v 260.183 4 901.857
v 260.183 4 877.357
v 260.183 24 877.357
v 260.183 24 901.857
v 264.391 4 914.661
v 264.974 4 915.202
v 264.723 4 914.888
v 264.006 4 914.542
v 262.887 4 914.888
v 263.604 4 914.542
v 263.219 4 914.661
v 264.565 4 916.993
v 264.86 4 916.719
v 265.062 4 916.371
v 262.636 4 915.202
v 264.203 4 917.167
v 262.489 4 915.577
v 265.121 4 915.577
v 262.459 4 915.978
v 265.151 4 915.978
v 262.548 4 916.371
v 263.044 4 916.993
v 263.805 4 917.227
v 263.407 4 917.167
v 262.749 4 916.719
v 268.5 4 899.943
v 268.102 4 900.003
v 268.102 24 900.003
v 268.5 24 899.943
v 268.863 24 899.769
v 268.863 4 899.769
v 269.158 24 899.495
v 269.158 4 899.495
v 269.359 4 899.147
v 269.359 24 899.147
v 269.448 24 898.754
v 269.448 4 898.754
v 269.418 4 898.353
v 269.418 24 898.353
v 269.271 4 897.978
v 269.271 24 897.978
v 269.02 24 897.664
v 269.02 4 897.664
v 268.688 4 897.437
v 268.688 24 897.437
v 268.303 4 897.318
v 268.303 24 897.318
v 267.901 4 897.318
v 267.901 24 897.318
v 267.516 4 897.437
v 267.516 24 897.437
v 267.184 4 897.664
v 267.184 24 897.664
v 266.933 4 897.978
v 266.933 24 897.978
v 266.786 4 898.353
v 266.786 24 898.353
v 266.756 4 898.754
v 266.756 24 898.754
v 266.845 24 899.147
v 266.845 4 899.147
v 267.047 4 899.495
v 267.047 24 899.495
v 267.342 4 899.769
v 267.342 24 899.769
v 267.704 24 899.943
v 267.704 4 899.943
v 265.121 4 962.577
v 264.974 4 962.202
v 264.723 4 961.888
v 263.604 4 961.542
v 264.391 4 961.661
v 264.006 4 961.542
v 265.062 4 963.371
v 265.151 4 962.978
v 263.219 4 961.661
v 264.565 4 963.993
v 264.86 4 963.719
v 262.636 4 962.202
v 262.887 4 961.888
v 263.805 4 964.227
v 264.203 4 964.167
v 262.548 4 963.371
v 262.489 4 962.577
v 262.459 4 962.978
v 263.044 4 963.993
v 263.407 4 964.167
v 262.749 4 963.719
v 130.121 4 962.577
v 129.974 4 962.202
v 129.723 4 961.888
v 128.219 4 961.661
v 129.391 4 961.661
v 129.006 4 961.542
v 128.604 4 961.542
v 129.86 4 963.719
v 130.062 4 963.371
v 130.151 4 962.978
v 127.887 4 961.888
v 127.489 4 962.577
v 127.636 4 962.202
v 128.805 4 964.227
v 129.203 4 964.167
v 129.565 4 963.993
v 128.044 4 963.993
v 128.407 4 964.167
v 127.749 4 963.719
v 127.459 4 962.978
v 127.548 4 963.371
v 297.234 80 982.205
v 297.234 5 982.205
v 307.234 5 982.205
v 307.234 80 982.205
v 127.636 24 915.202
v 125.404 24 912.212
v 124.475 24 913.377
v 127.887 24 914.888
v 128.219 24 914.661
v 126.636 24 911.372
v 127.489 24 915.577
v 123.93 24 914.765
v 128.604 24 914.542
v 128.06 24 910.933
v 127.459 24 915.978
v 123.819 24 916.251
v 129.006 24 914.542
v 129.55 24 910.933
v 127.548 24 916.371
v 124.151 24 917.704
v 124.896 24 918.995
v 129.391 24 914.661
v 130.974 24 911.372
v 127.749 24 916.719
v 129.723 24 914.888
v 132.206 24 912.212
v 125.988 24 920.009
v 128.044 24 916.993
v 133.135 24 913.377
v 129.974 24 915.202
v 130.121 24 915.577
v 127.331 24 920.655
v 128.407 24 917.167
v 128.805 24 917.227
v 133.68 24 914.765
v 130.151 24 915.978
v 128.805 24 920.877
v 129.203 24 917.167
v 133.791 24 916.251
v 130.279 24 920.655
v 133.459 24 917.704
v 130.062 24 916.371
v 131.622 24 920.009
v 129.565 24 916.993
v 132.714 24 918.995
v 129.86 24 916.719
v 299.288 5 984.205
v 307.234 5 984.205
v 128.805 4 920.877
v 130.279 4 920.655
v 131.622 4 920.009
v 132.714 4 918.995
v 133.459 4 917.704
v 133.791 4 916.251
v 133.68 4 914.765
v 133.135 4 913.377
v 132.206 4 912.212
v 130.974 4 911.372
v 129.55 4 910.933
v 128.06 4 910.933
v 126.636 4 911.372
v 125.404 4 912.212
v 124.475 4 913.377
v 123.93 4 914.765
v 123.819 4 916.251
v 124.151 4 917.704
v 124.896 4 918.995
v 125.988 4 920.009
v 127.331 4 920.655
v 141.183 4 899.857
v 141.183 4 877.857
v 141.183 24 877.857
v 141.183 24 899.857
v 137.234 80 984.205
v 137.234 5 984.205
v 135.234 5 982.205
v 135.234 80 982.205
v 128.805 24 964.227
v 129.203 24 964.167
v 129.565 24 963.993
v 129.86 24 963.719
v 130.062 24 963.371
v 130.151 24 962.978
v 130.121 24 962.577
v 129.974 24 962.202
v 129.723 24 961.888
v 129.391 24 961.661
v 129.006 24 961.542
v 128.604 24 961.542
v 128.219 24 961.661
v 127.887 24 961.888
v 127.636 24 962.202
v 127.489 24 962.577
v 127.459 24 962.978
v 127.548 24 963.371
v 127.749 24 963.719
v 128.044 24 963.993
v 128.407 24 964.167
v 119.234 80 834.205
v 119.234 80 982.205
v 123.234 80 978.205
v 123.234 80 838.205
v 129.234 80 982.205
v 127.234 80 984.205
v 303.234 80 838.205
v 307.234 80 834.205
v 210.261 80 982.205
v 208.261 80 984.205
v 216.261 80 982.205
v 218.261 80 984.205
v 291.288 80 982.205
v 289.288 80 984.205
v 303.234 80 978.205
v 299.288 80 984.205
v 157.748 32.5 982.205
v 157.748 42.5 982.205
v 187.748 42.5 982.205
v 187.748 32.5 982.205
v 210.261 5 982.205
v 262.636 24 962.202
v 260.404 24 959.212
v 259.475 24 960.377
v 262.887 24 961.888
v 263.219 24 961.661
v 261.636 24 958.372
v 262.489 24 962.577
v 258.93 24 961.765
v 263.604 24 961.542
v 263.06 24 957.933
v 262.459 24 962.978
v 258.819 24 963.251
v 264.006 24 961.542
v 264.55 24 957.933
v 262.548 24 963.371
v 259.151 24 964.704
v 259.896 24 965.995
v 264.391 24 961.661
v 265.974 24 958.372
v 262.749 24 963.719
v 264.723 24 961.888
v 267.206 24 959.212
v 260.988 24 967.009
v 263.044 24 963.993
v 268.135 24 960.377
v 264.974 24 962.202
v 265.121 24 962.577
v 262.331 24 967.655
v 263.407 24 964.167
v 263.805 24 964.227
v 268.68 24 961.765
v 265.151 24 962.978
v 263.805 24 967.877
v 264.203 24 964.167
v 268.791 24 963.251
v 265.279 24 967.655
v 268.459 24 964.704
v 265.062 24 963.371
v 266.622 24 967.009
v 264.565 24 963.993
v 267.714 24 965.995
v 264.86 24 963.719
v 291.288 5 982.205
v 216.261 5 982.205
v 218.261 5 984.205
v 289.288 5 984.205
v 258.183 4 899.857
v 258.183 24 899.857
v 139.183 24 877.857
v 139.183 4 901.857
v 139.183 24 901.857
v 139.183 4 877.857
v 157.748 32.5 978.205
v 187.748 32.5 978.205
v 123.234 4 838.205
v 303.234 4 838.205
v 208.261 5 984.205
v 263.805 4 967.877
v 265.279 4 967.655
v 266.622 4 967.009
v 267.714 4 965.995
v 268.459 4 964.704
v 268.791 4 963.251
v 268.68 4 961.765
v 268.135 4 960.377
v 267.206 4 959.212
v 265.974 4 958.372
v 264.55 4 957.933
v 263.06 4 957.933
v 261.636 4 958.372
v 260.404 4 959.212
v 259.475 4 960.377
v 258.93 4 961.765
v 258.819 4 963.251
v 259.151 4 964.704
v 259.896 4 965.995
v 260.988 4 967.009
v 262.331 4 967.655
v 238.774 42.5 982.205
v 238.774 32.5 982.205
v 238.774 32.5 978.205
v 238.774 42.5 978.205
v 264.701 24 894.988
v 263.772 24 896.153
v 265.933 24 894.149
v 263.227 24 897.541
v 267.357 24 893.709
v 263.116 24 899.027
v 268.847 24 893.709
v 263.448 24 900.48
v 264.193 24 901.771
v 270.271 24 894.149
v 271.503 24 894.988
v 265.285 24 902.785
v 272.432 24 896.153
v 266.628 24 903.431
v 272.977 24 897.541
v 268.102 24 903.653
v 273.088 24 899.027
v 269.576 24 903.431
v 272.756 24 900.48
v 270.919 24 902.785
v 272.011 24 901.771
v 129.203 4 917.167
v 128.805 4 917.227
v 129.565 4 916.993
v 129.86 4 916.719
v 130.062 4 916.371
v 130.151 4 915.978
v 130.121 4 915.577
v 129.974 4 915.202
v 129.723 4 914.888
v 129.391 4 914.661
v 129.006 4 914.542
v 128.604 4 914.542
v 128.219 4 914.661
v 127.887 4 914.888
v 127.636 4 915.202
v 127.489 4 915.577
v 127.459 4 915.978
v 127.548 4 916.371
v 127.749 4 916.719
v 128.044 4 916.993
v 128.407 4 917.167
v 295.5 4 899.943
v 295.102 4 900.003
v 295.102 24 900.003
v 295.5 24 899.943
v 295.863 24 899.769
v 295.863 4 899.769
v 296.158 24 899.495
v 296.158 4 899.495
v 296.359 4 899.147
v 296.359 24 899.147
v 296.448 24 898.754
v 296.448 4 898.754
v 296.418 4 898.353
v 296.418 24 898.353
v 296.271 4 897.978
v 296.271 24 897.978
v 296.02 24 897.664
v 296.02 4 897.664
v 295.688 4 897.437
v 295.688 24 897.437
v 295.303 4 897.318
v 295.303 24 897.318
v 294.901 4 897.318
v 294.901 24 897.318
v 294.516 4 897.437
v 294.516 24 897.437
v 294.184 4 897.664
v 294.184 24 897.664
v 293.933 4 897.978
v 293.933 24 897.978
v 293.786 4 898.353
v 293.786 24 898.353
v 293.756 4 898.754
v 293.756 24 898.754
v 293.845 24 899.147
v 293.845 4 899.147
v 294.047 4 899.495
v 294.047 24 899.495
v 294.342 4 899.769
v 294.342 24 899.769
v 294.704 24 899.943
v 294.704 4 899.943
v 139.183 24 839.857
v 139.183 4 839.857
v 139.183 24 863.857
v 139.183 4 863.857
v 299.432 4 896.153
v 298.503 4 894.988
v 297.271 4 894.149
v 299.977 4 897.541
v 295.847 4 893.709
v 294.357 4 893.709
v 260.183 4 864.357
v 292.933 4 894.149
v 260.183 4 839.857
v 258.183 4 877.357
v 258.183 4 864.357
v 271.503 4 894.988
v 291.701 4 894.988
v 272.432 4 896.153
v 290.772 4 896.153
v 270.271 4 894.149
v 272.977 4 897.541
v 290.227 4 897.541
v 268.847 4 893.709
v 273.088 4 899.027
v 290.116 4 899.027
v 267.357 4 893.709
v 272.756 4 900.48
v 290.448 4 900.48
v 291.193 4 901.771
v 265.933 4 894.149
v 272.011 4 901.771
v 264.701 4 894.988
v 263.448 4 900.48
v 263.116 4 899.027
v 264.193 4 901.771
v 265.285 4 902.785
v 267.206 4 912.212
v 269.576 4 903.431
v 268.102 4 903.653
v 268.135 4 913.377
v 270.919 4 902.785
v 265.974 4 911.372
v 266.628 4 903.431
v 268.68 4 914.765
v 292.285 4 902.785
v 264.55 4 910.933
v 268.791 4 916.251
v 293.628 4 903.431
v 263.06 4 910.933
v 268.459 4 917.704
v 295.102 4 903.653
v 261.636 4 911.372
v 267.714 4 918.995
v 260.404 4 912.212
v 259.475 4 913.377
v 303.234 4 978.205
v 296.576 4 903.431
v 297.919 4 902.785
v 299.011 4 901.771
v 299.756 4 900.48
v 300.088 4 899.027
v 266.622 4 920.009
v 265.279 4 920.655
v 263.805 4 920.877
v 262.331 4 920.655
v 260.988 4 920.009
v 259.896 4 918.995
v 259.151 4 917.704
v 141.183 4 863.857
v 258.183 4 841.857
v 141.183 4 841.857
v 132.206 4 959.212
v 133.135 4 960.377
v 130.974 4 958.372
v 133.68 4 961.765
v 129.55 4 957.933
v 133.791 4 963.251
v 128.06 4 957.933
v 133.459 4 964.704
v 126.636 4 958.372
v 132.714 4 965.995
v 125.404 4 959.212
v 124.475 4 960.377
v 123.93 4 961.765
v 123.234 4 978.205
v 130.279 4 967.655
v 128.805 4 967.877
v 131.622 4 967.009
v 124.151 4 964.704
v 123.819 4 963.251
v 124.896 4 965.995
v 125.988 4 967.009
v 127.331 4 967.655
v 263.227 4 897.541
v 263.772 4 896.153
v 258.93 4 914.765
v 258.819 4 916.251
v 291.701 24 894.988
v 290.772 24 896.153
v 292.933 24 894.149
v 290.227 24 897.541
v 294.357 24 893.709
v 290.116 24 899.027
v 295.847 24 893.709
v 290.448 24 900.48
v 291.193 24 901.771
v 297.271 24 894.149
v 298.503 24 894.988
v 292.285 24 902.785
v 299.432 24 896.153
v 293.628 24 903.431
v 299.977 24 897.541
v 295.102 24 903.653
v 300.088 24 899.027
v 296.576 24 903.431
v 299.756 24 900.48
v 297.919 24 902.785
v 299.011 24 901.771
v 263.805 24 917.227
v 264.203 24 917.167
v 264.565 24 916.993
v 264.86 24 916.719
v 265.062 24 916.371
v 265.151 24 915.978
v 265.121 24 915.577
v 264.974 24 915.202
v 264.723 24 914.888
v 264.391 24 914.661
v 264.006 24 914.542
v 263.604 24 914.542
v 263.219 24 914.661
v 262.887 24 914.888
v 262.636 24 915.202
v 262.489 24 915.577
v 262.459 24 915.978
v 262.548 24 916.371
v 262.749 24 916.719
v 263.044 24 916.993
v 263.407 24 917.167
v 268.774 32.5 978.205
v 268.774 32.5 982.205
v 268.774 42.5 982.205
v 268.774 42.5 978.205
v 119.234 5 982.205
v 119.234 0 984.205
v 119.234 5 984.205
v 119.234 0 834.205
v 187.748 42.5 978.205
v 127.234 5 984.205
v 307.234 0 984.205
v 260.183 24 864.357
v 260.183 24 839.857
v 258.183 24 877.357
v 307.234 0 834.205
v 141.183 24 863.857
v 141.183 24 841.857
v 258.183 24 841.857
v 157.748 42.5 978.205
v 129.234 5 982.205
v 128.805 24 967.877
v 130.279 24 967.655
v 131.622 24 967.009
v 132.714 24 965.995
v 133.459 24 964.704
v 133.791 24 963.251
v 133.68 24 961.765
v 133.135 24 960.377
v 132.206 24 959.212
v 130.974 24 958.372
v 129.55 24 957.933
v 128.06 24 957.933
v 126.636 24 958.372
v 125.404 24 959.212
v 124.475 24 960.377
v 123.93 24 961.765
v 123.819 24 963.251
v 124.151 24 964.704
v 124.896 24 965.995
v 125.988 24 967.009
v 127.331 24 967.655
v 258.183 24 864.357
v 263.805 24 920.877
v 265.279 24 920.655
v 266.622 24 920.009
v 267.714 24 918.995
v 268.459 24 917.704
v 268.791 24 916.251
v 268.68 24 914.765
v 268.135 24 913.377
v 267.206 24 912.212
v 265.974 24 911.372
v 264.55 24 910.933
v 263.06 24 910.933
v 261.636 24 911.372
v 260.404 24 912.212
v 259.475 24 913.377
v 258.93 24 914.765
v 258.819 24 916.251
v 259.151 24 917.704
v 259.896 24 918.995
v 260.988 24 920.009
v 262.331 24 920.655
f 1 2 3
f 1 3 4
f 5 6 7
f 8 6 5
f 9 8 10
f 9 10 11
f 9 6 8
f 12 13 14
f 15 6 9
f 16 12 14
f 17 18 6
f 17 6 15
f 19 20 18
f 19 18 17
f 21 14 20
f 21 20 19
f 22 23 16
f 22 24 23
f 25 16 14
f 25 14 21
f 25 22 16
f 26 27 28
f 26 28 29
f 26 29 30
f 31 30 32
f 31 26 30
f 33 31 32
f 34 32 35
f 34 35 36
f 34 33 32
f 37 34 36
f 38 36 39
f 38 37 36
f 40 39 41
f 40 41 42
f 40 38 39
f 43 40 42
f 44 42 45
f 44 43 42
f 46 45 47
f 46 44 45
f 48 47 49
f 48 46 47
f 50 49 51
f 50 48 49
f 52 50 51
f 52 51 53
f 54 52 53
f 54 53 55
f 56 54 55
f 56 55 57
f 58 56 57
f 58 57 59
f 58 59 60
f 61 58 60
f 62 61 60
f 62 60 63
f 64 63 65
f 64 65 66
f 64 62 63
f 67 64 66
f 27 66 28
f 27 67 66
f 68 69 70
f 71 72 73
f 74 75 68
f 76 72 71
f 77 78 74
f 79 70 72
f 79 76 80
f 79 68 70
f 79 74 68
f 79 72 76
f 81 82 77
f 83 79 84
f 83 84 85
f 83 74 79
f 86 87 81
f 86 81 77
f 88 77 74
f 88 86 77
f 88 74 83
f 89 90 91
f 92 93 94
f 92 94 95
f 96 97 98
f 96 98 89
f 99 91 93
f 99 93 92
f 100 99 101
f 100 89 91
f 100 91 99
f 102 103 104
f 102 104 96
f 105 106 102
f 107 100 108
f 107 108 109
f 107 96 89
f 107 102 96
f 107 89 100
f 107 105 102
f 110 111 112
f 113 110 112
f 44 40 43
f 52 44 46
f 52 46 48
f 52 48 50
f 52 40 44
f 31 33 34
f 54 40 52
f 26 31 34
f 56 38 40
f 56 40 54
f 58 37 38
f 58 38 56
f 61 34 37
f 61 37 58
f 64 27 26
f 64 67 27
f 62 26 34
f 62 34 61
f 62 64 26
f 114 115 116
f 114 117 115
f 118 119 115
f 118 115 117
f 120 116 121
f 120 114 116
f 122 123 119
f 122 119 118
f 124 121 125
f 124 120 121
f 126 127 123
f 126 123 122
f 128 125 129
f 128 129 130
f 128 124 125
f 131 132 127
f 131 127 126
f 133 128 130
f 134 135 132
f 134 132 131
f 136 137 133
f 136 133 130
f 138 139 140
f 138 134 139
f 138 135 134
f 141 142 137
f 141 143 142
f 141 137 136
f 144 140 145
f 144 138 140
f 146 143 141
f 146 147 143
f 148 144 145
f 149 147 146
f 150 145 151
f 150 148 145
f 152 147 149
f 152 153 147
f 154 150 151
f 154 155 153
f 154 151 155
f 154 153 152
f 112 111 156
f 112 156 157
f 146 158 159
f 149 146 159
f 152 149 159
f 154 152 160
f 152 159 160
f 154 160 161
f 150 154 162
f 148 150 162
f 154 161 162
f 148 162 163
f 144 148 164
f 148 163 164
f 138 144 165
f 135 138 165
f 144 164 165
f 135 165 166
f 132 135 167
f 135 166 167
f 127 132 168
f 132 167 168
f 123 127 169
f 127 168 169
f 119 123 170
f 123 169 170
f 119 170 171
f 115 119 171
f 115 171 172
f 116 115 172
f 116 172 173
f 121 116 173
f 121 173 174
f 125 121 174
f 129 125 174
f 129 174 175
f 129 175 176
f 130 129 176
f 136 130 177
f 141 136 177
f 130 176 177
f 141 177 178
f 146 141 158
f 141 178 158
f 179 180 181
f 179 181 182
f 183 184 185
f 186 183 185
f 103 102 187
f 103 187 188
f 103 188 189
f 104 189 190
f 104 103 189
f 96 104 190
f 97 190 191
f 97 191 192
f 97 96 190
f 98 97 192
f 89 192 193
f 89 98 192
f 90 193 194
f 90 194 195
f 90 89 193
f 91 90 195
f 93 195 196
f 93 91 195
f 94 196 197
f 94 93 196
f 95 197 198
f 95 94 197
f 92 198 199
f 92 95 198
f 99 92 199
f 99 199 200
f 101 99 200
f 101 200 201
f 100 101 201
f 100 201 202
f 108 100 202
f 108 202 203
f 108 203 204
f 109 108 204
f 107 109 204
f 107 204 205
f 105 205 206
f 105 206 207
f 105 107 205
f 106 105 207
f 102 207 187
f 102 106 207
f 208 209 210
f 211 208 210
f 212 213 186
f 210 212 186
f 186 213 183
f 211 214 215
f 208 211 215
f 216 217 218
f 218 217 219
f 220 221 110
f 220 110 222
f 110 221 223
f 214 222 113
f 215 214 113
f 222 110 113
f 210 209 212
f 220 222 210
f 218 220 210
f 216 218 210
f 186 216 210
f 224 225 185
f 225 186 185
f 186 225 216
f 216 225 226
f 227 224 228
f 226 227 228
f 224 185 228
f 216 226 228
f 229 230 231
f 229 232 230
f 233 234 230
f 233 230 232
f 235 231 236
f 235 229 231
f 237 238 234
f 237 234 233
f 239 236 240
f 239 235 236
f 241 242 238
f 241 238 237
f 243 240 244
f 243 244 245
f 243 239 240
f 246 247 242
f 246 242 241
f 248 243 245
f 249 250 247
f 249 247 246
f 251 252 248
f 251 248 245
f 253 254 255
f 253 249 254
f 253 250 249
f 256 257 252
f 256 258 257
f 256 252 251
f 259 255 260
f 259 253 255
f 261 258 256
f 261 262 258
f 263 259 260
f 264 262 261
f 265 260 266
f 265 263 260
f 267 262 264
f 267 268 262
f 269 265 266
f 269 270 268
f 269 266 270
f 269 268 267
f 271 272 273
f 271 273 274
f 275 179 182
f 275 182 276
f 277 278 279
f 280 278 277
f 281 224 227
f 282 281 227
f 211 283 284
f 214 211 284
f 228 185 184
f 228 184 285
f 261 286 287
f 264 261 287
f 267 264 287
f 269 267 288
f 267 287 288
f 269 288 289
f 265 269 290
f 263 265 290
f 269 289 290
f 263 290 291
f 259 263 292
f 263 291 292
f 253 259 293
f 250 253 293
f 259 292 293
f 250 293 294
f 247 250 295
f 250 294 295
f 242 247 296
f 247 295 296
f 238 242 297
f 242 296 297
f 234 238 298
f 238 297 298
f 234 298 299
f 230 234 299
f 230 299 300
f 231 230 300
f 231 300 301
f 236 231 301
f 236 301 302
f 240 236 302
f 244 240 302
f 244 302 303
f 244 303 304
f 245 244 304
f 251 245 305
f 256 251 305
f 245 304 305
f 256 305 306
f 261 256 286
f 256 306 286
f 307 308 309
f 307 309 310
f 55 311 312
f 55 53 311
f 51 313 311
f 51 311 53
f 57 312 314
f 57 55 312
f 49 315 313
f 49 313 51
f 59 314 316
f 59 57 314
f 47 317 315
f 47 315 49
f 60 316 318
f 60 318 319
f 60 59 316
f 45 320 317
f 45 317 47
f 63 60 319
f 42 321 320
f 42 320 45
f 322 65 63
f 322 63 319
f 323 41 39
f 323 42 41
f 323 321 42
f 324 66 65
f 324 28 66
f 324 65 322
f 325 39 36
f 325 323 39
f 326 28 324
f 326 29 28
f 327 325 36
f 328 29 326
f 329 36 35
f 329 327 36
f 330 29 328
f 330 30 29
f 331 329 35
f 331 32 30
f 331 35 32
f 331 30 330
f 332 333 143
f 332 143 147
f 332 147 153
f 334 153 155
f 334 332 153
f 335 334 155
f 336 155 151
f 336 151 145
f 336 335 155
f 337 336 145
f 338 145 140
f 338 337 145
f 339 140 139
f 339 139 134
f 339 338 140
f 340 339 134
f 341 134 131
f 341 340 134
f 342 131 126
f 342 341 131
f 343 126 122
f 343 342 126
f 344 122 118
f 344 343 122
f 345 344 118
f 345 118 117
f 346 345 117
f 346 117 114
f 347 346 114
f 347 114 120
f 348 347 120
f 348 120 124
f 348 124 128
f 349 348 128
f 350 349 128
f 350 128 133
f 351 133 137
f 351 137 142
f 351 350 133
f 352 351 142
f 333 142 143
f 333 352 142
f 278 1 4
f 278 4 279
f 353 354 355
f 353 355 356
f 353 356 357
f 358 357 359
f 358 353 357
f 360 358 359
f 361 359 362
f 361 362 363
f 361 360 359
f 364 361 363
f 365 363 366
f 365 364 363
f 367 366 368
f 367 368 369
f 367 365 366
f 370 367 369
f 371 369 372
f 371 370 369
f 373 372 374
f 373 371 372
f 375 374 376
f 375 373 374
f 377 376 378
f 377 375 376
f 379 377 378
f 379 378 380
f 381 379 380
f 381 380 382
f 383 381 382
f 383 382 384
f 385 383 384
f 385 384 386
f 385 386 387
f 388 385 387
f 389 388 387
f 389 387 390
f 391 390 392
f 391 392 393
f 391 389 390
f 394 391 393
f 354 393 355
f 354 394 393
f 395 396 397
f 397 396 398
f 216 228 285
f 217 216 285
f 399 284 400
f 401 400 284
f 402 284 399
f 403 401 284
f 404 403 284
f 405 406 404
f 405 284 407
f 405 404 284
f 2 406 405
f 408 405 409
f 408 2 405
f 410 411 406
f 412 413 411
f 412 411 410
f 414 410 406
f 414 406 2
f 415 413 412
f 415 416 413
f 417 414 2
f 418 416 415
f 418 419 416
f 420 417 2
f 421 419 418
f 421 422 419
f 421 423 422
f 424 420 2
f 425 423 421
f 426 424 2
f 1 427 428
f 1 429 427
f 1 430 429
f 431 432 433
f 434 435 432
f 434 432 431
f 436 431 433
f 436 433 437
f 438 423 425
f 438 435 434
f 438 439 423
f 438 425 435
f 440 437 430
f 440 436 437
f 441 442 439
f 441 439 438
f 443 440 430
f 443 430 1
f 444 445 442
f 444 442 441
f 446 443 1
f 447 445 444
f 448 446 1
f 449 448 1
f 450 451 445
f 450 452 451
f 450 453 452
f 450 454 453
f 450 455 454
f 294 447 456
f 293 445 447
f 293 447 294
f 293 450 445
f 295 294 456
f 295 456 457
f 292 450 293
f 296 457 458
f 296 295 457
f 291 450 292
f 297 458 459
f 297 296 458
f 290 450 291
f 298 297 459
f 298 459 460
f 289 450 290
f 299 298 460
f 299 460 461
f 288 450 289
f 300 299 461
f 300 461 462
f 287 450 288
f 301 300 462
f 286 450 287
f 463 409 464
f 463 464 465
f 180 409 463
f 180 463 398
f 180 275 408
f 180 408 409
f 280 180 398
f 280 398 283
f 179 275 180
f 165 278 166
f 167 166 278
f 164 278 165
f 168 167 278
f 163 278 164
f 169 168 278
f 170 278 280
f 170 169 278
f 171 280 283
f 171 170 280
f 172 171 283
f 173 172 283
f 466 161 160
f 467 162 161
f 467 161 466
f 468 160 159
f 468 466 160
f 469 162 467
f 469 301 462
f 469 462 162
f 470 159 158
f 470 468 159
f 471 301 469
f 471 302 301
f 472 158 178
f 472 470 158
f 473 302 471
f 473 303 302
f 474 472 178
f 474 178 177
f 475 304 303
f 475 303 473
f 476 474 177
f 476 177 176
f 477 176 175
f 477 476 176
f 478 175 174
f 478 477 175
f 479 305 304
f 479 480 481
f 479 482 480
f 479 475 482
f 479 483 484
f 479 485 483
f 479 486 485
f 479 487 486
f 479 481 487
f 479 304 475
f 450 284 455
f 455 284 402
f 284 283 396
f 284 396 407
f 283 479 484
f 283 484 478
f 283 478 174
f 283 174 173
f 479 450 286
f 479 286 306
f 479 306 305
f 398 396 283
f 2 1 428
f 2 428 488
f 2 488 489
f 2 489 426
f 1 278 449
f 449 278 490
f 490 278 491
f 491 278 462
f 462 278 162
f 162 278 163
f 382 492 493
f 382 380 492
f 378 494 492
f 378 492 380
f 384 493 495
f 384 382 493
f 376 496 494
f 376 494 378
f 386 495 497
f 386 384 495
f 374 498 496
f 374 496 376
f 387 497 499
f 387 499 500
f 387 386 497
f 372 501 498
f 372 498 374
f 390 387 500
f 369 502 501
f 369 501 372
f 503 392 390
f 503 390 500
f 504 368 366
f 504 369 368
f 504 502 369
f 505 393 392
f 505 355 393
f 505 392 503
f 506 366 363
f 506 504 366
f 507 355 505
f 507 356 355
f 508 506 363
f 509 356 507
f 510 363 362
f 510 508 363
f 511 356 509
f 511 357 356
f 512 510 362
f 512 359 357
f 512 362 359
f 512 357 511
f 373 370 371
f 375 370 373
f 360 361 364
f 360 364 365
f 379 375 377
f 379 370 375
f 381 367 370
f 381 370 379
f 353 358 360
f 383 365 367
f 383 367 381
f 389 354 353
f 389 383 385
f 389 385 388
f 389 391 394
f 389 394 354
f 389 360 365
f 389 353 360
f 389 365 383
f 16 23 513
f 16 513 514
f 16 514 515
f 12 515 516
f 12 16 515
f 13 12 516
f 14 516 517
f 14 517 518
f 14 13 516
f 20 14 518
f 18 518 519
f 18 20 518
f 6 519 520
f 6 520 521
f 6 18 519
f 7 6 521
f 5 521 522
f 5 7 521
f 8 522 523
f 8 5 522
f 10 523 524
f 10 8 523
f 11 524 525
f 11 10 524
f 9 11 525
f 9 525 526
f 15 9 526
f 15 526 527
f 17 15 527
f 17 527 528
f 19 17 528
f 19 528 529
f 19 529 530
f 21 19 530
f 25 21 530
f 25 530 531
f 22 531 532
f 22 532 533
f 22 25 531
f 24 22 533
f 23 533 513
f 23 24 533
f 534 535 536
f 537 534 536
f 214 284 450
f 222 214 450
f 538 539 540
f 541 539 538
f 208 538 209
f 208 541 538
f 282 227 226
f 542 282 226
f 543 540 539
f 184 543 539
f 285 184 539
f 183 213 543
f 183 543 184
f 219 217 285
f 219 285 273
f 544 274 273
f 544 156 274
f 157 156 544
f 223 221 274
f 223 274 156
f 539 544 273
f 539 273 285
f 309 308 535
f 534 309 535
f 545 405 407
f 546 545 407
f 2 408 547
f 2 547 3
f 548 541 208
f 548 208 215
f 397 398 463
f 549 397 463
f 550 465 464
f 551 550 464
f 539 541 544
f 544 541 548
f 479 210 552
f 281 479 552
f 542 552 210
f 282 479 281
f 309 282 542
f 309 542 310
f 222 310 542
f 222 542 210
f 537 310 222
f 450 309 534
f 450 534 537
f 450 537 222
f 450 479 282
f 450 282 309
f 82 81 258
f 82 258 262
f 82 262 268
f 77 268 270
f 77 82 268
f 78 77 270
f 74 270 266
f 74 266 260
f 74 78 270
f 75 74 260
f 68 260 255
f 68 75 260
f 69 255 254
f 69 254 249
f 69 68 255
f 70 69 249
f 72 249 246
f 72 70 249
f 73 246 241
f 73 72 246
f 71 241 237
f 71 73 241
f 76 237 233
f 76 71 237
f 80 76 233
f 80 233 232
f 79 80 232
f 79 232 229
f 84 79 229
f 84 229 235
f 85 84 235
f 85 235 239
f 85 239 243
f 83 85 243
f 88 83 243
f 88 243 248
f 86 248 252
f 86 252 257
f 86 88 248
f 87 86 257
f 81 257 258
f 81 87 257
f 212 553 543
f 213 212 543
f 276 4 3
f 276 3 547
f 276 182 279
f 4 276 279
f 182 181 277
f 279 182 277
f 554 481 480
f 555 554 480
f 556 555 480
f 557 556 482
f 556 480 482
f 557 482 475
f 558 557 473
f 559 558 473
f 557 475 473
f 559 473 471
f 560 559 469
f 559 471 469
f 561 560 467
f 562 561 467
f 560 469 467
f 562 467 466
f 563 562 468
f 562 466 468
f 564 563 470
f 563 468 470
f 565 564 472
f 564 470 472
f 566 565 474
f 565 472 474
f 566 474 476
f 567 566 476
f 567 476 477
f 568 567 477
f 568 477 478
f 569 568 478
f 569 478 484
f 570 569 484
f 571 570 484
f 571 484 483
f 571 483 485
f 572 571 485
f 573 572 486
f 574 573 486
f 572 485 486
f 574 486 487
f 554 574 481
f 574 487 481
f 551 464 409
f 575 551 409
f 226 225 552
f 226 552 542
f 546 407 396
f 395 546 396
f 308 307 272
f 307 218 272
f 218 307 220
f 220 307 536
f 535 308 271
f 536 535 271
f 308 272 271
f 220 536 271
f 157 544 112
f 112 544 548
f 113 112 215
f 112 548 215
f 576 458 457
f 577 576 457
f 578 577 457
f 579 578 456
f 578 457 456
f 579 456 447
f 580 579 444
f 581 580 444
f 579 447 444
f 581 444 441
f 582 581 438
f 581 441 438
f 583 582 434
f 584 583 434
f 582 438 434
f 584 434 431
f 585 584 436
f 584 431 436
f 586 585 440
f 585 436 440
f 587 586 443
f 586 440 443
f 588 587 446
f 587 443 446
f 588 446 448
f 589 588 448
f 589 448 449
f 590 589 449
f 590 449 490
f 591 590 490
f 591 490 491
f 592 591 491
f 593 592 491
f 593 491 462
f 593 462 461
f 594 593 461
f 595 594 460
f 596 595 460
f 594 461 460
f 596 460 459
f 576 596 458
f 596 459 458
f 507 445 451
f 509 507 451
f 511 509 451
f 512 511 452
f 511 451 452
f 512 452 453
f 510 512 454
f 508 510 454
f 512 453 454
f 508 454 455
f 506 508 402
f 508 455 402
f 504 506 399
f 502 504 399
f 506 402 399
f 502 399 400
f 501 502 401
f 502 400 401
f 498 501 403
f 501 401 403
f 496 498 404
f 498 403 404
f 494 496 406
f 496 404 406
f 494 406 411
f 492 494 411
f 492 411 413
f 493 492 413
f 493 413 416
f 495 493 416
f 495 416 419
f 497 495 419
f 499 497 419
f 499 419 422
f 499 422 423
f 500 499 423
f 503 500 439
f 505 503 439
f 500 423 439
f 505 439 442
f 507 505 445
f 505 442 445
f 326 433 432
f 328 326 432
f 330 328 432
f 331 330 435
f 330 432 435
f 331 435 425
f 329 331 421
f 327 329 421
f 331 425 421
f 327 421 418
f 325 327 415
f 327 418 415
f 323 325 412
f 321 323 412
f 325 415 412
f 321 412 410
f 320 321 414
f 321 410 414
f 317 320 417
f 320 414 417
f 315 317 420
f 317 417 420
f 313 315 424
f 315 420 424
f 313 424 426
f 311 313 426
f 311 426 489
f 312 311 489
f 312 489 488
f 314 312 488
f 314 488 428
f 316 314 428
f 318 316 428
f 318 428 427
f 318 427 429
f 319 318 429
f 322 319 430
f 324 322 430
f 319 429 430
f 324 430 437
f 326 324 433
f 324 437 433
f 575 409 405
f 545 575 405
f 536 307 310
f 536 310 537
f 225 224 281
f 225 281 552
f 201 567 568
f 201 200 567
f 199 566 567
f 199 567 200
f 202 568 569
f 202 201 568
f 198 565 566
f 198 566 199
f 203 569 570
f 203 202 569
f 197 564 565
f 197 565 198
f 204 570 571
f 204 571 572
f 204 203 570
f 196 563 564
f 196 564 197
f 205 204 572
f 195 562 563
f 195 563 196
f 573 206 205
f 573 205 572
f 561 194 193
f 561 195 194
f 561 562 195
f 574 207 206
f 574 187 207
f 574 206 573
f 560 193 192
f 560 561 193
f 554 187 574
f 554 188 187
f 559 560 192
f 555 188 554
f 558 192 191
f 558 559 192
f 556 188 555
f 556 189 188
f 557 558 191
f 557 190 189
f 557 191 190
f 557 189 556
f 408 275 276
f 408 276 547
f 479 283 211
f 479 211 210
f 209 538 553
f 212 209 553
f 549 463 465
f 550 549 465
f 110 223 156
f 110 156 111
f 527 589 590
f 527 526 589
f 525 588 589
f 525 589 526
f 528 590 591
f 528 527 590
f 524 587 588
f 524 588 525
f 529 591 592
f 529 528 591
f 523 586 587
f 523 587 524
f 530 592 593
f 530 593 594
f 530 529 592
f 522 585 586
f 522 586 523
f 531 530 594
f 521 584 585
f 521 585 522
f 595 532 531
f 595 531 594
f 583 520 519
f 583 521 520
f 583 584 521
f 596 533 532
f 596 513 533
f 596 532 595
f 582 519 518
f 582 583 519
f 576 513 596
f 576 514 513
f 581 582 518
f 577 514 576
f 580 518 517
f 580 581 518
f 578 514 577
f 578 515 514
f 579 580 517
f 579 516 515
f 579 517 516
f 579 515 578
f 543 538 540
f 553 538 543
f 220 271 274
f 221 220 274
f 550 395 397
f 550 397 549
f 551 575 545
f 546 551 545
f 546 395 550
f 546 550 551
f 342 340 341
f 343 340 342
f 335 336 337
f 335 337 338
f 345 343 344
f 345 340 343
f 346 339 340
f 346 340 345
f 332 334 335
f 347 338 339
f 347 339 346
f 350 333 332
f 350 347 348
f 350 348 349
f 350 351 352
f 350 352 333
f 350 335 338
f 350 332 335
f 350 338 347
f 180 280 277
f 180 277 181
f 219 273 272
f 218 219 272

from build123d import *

# Parameters (mm, degrees)
SZKIC1_W                    = 180
SZKIC1_H                    = 140
DODANIE_WYCI_GNI_CIE1_DEPTH = 4
SZKIC6_R                    = 5
SZKIC6_R_2                  = 1.35
DODANIE_WYCI_GNI_CIE2_DEPTH = 20
SZKIC13_W                   = 188
SZKIC13_H                   = 148
SZKIC13_W_2                 = 180
SZKIC13_H_2                 = 140
DODANIE_WYCI_GNI_CIE3_DEPTH = 80
SZKIC14_W                   = 188
SZKIC14_H                   = 5
DODANIE_WYCI_GNI_CIE4_DEPTH = 2
DODANIE_WYCI_GNI_CIE5_DEPTH = 75
WYTNIJ_WYCI_GNI_CIE1_REACH  = 352.281
SZKIC17_W                   = 30
SZKIC17_H                   = 10


with BuildPart() as part:
    # Szkic1 → Dodanie-wyciągnięcie1 (new body)
    with BuildSketch(Plane(origin=(0, 0, 0), x_dir=(-1, 0, 0), z_dir=(0, 1, 0))):
        with Locations((-213.234437894, 908.204921089)):
            Rectangle(SZKIC1_W, SZKIC1_H)
    extrude(amount=DODANIE_WYCI_GNI_CIE1_DEPTH)

    # Szkic6 → Dodanie-wyciągnięcie2 (add)
    # profile 1 of 8: a face of its own
    with BuildSketch(Plane(origin=(0, 4, 0), x_dir=(1, 0, 0), z_dir=(0, 1, 0))):
        with Locations(Location((263.804943957, -915.877316695, 0), (0, 0, 270))):
            Circle(SZKIC6_R)
        with Locations(Location((263.804943957, -915.877316695, 0), (0, 0, 270))):
            Circle(SZKIC6_R_2, mode=Mode.SUBTRACT)
    # profile 2 of 8: a face of its own
    with BuildSketch(Plane(origin=(0, 4, 0), x_dir=(1, 0, 0), z_dir=(0, 1, 0))):
        with Locations(Location((263.804943957, -962.877316695, 0), (0, 0, 270))):
            Circle(SZKIC6_R)
        with Locations(Location((263.804943957, -962.877316695, 0), (0, 0, 270))):
            Circle(SZKIC6_R_2, mode=Mode.SUBTRACT)
    # profile 3 of 8: a face of its own
    with BuildSketch(Plane(origin=(0, 4, 0), x_dir=(1, 0, 0), z_dir=(0, 1, 0))):
        with Locations(Location((128.804943957, -915.877316695, 0), (0, 0, 270))):
            Circle(SZKIC6_R)
        with Locations(Location((128.804943957, -915.877316695, 0), (0, 0, 270))):
            Circle(SZKIC6_R_2, mode=Mode.SUBTRACT)
    # profile 4 of 8: a face of its own
    with BuildSketch(Plane(origin=(0, 4, 0), x_dir=(1, 0, 0), z_dir=(0, 1, 0))):
        with Locations(Location((128.804943957, -962.877316695, 0), (0, 0, 270))):
            Circle(SZKIC6_R)
        with Locations(Location((128.804943957, -962.877316695, 0), (0, 0, 270))):
            Circle(SZKIC6_R_2, mode=Mode.SUBTRACT)
    # profile 5 of 8: a face of its own
    with BuildSketch(Plane(origin=(0, 4, 0), x_dir=(1, 0, 0), z_dir=(0, 1, 0))):
        with Locations(Location((268.102028807, -898.653399162, 0), (0, 0, 270))):
            Circle(SZKIC6_R)
        with Locations(Location((268.102028807, -898.653399162, 0), (0, 0, 270))):
            Circle(SZKIC6_R_2, mode=Mode.SUBTRACT)
    # profile 6 of 8: a face of its own
    with BuildSketch(Plane(origin=(0, 4, 0), x_dir=(1, 0, 0), z_dir=(0, 1, 0))):
        with Locations(Location((295.102028807, -898.653399162, 0), (0, 0, 270))):
            Circle(SZKIC6_R)
        with Locations(Location((295.102028807, -898.653399162, 0), (0, 0, 270))):
            Circle(SZKIC6_R_2, mode=Mode.SUBTRACT)
    # profile 7 of 8: a face of its own
    with BuildSketch(Plane(origin=(0, 4, 0), x_dir=(1, 0, 0), z_dir=(0, 1, 0))):
        Polygon((258.182980941, -864.357234477), (260.182980941, -864.357234477), (260.182980941, -839.857234477), (139.182980941, -839.857234477), (139.182980941, -863.857234467), (141.182980941, -863.857234467), (141.182980941, -841.857234452), (258.182980941, -841.857234452), align=None)
    # profile 8 of 8: a face of its own
    with BuildSketch(Plane(origin=(0, 4, 0), x_dir=(1, 0, 0), z_dir=(0, 1, 0))):
        Polygon((141.182980941, -877.857234487), (141.182980941, -899.857234503), (258.182980941, -899.857234503), (258.182980941, -877.357234477), (260.182980941, -877.357234477), (260.182980941, -901.857234477), (139.182980941, -901.857234477), (139.182980941, -877.857234487), align=None)
    extrude(amount=DODANIE_WYCI_GNI_CIE2_DEPTH)

    # Szkic13 → Dodanie-wyciągnięcie3 (add)
    with BuildSketch(Plane.XZ):
        with Locations((213.234437894, 908.204921089)):
            Rectangle(SZKIC13_W, SZKIC13_H)
        with Locations((213.234437894, 908.204921089)):
            Rectangle(SZKIC13_W_2, SZKIC13_H_2, mode=Mode.SUBTRACT)
    extrude(amount=-DODANIE_WYCI_GNI_CIE3_DEPTH)

    # Szkic14 → Dodanie-wyciągnięcie4 (add)
    with BuildSketch(Plane.XY.offset(982.204921089)):
        with Locations((213.234437894, 2.5)):
            Rectangle(SZKIC14_W, SZKIC14_H)
    extrude(amount=DODANIE_WYCI_GNI_CIE4_DEPTH)

    # Szkic15 → Dodanie-wyciągnięcie5 (add)
    with BuildSketch(Plane(origin=(0, 5, 0), x_dir=(1, 0, 0), z_dir=(0, 1, 0))):
        Polygon((299.287557022, -984.204921089), (297.234437894, -982.204921089), (291.287557022, -982.204921089), (289.287557022, -984.204921089), align=None)
        Polygon((135.234437894, -982.204921089), (129.234437894, -982.204921089), (127.234437894, -984.204921089), (137.234437894, -984.204921089), align=None)
        Polygon((208.260997458, -984.204921089), (218.260997458, -984.204921089), (216.260997458, -982.204921089), (210.260997458, -982.204921089), align=None)
    extrude(amount=DODANIE_WYCI_GNI_CIE5_DEPTH)

    # Szkic17 → Wytnij-wyciągnięcie1 (cut, up to next)
    with BuildSketch(Plane.XY.offset(982.204921089), mode=Mode.PRIVATE) as wytnij_wyci_gni_cie1_sk1:
        with Locations((253.77427724, 37.5)):
            Rectangle(SZKIC17_W, SZKIC17_H)
    wytnij_wyci_gni_cie1_tool1 = extrude(wytnij_wyci_gni_cie1_sk1.sketch, amount=-WYTNIJ_WYCI_GNI_CIE1_REACH, mode=Mode.PRIVATE) & part.part
    # Szkic17 → Wytnij-wyciągnięcie1 (cut, up to next)
    with BuildSketch(Plane.XY.offset(982.204921089), mode=Mode.PRIVATE) as wytnij_wyci_gni_cie1_sk2:
        with Locations((172.747717676, 37.5)):
            Rectangle(SZKIC17_W, SZKIC17_H)
    wytnij_wyci_gni_cie1_tool2 = extrude(wytnij_wyci_gni_cie1_sk2.sketch, amount=-WYTNIJ_WYCI_GNI_CIE1_REACH, mode=Mode.PRIVATE) & part.part
    add(wytnij_wyci_gni_cie1_tool1.solids().sort_by_distance((253.774277, 37.5, 982.204921))[0], mode=Mode.SUBTRACT)
    add(wytnij_wyci_gni_cie1_tool2.solids().sort_by_distance((172.747718, 37.5, 982.204921))[0], mode=Mode.SUBTRACT)


solid = part.part
